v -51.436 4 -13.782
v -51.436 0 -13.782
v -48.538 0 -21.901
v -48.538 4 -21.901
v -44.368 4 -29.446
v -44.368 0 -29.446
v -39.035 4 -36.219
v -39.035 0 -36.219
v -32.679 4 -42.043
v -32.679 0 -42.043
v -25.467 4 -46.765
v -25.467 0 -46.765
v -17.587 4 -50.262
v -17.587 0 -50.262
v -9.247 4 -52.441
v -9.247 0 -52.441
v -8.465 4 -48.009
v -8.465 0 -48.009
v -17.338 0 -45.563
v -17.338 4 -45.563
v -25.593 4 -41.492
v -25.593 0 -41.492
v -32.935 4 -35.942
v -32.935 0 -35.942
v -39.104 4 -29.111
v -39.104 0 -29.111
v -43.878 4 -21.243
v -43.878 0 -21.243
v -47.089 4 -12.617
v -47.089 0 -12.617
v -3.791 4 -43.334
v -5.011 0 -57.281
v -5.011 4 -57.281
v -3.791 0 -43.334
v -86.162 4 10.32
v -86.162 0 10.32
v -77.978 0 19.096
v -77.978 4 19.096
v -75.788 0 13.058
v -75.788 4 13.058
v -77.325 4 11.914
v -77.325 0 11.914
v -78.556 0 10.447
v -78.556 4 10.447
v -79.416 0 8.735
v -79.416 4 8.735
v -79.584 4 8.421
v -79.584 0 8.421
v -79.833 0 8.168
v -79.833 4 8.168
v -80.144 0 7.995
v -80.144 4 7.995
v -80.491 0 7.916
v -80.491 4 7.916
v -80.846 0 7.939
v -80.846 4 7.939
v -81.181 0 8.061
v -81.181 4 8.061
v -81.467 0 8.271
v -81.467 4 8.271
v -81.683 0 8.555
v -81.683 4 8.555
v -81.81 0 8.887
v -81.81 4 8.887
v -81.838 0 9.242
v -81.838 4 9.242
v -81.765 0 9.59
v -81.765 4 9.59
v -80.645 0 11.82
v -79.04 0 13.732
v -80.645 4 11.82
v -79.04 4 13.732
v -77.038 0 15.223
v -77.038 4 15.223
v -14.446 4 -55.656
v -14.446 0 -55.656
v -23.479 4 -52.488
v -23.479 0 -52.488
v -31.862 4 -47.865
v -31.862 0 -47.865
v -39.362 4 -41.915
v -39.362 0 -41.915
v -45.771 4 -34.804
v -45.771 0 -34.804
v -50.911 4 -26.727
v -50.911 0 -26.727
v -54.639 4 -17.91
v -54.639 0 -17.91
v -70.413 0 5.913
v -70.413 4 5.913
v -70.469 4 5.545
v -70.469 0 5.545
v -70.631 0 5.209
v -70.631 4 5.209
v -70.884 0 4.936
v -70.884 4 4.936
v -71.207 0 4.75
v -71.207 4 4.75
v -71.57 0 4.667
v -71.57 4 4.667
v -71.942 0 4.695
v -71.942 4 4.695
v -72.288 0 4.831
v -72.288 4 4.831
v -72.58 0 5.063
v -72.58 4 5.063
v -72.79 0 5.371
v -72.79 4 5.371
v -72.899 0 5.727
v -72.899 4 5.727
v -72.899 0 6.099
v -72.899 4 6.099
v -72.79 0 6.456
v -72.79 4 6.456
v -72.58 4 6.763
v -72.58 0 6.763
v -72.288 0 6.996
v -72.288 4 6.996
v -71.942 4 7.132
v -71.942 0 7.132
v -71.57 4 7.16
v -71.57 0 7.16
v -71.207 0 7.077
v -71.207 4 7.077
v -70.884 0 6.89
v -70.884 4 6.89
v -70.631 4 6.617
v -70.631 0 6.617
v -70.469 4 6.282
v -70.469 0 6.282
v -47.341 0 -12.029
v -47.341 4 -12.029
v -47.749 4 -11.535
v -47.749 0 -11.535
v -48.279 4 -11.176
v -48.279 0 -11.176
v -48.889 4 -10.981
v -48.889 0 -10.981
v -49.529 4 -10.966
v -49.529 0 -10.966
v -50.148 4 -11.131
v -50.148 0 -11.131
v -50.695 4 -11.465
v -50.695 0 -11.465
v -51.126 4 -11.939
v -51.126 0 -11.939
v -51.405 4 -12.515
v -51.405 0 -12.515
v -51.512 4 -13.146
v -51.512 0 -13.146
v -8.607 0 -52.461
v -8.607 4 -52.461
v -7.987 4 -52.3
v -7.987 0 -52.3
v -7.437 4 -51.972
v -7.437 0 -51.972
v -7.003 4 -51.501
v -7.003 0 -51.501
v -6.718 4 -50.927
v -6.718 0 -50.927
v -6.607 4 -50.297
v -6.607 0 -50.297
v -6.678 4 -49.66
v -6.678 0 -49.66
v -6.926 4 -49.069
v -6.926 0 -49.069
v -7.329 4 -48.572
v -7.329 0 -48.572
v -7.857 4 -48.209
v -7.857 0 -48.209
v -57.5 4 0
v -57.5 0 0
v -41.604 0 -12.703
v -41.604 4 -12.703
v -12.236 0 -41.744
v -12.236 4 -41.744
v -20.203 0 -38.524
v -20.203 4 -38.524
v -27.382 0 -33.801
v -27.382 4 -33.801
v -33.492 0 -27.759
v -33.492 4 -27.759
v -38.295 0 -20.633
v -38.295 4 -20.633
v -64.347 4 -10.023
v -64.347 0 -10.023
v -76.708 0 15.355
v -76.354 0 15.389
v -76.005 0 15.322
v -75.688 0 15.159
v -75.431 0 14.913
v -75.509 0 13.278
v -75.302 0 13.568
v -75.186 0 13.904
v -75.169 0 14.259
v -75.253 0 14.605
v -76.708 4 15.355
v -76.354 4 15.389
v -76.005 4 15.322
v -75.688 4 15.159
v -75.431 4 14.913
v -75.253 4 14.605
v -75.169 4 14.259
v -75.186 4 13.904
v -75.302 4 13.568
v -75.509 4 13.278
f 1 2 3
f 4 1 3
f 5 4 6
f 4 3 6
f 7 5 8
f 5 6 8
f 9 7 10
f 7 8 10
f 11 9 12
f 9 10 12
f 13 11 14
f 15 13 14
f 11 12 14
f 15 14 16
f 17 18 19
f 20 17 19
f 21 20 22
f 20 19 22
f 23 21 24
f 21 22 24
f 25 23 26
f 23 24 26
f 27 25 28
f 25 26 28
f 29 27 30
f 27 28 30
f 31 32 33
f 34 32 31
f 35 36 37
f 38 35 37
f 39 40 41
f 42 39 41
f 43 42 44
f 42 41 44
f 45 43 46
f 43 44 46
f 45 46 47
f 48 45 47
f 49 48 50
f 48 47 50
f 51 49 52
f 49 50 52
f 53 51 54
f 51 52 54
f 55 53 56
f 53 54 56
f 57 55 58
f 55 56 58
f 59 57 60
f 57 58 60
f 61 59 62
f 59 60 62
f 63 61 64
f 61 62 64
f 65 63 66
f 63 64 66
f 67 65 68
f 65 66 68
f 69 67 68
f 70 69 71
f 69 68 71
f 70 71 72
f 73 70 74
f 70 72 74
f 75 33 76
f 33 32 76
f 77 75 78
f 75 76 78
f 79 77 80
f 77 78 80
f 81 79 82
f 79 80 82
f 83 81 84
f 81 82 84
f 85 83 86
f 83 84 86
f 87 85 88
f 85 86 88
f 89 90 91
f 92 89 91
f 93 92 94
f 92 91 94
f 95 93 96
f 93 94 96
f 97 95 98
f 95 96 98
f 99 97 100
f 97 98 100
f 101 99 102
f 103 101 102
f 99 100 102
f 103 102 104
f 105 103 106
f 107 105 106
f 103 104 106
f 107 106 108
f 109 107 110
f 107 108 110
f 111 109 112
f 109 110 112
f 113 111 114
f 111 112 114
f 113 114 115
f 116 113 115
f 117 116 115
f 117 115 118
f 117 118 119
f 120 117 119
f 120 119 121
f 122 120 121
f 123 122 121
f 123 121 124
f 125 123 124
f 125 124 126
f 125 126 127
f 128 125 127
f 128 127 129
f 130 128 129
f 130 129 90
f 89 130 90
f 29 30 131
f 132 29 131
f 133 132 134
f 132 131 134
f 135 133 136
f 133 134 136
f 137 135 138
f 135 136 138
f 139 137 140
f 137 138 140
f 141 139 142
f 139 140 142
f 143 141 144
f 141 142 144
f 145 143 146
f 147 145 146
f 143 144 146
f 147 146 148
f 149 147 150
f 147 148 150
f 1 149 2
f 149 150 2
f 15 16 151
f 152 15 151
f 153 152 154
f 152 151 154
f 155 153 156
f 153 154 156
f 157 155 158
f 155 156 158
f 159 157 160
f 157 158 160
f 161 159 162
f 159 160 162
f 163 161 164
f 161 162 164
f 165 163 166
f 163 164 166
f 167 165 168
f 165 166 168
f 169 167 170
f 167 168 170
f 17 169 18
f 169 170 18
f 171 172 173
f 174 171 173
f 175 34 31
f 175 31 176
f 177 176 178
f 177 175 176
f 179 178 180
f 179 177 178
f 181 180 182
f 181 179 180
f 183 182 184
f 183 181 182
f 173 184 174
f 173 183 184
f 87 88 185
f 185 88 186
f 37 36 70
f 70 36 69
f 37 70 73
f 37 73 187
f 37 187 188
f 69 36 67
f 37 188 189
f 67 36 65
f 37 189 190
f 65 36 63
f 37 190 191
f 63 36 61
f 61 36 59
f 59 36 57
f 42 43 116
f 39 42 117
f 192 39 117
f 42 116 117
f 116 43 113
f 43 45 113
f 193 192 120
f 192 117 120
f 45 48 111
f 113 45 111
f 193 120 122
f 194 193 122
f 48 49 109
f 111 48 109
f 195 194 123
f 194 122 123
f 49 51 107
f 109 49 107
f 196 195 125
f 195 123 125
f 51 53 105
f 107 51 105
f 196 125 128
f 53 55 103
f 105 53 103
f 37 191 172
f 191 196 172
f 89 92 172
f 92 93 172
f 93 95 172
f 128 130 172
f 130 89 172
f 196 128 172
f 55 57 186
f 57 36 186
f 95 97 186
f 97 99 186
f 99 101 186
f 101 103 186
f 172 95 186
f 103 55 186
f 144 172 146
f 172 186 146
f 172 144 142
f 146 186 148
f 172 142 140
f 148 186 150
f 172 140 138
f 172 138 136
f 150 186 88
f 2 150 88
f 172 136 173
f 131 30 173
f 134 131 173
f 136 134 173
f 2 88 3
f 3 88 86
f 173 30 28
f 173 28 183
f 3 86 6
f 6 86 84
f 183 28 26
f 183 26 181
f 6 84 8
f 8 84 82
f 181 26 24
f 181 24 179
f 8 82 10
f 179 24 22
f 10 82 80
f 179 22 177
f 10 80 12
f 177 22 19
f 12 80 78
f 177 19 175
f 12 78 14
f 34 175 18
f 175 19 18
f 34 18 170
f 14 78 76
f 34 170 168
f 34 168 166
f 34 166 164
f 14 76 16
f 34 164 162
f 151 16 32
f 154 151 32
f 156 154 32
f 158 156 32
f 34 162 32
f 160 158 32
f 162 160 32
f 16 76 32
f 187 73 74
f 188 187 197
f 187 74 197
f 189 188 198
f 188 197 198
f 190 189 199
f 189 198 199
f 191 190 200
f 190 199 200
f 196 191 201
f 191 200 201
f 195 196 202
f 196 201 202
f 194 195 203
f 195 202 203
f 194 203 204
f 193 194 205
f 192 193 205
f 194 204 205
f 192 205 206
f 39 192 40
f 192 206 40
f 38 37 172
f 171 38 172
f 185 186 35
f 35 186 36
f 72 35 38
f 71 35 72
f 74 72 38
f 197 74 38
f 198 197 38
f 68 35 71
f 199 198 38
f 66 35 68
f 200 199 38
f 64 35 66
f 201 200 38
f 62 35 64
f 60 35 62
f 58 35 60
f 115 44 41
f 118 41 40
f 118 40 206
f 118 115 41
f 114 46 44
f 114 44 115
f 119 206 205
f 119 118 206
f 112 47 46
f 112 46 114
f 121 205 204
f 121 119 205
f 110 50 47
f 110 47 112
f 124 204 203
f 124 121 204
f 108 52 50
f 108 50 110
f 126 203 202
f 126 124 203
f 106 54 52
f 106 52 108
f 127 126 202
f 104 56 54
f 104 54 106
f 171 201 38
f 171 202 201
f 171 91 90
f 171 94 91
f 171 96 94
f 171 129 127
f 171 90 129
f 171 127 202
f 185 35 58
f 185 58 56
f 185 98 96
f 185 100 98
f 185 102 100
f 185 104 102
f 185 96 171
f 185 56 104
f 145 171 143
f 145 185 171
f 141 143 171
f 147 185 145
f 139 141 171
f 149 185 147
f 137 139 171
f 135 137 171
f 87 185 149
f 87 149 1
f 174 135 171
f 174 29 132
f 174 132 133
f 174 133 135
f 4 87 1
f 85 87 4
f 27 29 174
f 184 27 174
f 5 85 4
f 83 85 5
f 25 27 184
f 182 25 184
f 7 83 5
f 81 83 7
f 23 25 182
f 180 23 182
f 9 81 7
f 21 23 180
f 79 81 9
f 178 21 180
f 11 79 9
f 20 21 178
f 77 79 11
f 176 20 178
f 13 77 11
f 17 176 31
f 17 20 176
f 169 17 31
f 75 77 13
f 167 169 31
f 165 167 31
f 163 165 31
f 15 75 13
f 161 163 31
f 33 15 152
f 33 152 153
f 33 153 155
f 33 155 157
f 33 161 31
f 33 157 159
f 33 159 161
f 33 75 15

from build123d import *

# Parameters (mm, degrees)
SKETCH1_R           = 57.5
BOSS_EXTRUDE1_DEPTH = 4
BOSS_EXTRUDE2_DEPTH = 4
CUT_EXTRUDE1_DEPTH  = 5
CUT_EXTRUDE2_DEPTH  = 5
SKETCH5_R           = 43.5
CUT_EXTRUDE3_DEPTH  = 5
CUT_EXTRUDE7_DEPTH  = 5
SKETCH9_R           = 1.25
CUT_EXTRUDE10_DEPTH = 5
CUT_EXTRUDE14_DEPTH = 5


with BuildPart() as part:
    # Sketch1 → Boss-Extrude1 (new body)
    with BuildSketch(Plane(origin=(0, 0, 0), x_dir=(1, 0, 0), z_dir=(0, 1, 0))):
        Circle(SKETCH1_R)
    extrude(amount=BOSS_EXTRUDE1_DEPTH)

    # Sketch2 → Boss-Extrude2 (add)
    with BuildSketch(Plane(origin=(0, 0, 0), x_dir=(1, 0, 0), z_dir=(0, 1, 0))):
        Polygon((-77.977903645, -19.095954082), (-57.5, 0), (-44.924411203, 0), (-44.924411203, 25.803568088), (-64.346784729, 10.023199482), (-86.161883966, -10.319709662), align=None)
    extrude(amount=BOSS_EXTRUDE2_DEPTH)

    # Sketch3 → Cut-Extrude1 (cut, through all)
    with BuildSketch(Plane(origin=(0, 0, 0), x_dir=(1, 0, 0), z_dir=(0, 1, 0))):
        with BuildLine():
            ThreePointArc((-51.43555025, 13.782114152), (-35.975178556, 39.260018185), (-9.246765461, 52.441012848))
            ThreePointArc((-9.246765461, 52.441012848), (-6.640239617, 50.615903803), (-8.465348661, 48.009377959))
            ThreePointArc((-8.465348661, 48.009377959), (-32.935022621, 35.942270169), (-47.088884032, 12.617428449))
            ThreePointArc((-47.088884032, 12.617428449), (-49.844559992, 11.026438191), (-51.43555025, 13.782114152))
        make_face()
    extrude(amount=CUT_EXTRUDE1_DEPTH, mode=Mode.SUBTRACT)

    # Sketch4 → Cut-Extrude2 (cut, through all)
    with BuildSketch(Plane(origin=(0, 0, 0), x_dir=(1, 0, 0), z_dir=(0, 1, 0))):
        with BuildLine():
            Line((0, 0), (-57.5, 0))
            ThreePointArc((-57.5, 0), (42.393446867, -38.846436938), (-5.011455208, 57.28119514))
            Line((-5.011455208, 57.28119514), (0, 0))
        make_face()
    extrude(amount=CUT_EXTRUDE2_DEPTH, mode=Mode.SUBTRACT)

    # Sketch5 → Cut-Extrude3 (cut, through all)
    with BuildSketch(Plane(origin=(0, 0, 0), x_dir=(1, 0, 0), z_dir=(0, 1, 0))):
        Circle(SKETCH5_R)
    extrude(amount=CUT_EXTRUDE3_DEPTH, mode=Mode.SUBTRACT)

    # Sketch7 → Cut-Extrude7 (cut, through all)
    with BuildSketch(Plane(origin=(0, 0, 0), x_dir=(1, 0, 0), z_dir=(0, 1, 0))):
        Polygon((-57.5, 0), (-41.603937585, 12.702849184), (-43.5, 0), align=None)
    extrude(amount=CUT_EXTRUDE7_DEPTH, mode=Mode.SUBTRACT)

    # Sketch9 → Cut-Extrude10 (cut, through all)
    with BuildSketch(Plane(origin=(0, 4, 0), x_dir=(1, 0, 0), z_dir=(0, 1, 0))):
        with Locations((-76.485000828, -14.098640015)):
            Circle(SKETCH9_R)
        with Locations((-71.66338638, -5.91316299)):
            Circle(SKETCH9_R)
    extrude(amount=-CUT_EXTRUDE10_DEPTH, mode=Mode.SUBTRACT)

    # Sketch10 → Cut-Extrude14 (cut, through all)
    with BuildSketch(Plane(origin=(0, 4, 0), x_dir=(1, 0, 0), z_dir=(0, 1, 0))):
        with BuildLine():
            ThreePointArc((-75.78838638, -13.057872572), (-77.983253036, -11.21616077), (-79.415850502, -8.734829173))
            ThreePointArc((-79.415850502, -8.734829173), (-81.017991457, -7.987738576), (-81.765082054, -9.589879531))
            ThreePointArc((-81.765082054, -9.589879531), (-79.898364144, -12.823129794), (-77.03838638, -15.222936081))
            ThreePointArc((-77.03838638, -15.222936081), (-75.330854625, -14.765404326), (-75.78838638, -13.057872572))
        make_face()
    extrude(amount=-CUT_EXTRUDE14_DEPTH, mode=Mode.SUBTRACT)


solid = part.part
